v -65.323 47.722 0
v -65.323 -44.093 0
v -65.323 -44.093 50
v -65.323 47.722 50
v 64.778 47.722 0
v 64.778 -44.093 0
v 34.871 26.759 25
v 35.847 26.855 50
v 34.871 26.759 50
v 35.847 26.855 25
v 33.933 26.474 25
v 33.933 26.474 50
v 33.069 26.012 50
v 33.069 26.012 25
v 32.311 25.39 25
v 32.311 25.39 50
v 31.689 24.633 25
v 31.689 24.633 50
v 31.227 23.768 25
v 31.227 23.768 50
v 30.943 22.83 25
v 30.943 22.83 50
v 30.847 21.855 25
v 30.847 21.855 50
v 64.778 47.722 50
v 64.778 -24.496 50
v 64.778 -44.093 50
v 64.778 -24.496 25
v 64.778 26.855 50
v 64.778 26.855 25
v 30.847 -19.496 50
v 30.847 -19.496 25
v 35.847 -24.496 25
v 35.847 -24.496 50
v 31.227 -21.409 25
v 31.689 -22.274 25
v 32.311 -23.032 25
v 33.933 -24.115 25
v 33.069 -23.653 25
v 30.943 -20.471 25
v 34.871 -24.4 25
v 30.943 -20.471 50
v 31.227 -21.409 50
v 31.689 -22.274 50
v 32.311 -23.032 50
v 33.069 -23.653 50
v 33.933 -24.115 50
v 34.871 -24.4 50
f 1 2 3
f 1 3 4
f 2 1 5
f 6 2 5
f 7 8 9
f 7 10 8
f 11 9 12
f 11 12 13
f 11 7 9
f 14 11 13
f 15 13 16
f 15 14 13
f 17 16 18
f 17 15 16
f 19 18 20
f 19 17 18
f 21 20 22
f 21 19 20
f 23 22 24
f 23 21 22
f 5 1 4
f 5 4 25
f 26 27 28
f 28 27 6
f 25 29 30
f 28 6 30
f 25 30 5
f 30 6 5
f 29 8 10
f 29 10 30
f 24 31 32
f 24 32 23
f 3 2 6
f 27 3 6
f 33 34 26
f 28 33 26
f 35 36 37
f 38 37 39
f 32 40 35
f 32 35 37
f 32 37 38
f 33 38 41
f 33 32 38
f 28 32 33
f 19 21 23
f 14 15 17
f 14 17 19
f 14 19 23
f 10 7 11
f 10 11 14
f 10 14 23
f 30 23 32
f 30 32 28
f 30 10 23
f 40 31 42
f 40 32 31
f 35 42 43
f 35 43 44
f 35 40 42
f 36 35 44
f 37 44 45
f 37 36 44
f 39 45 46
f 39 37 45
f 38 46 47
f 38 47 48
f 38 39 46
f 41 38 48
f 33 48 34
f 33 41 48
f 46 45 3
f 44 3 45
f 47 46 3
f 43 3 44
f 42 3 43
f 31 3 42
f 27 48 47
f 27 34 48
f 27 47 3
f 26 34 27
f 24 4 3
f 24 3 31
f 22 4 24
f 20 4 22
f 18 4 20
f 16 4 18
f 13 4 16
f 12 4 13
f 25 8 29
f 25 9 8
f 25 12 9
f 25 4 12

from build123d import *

# Parameters (mm, degrees)
F0_W     = 130.100816
F0_H     = 91.814518
F1_DEPTH = 50
F2_W     = 33.931456
F2_H     = 51.350809
F3_DEPTH = 25
F4_R     = 5


with BuildPart() as f1:
    # F0 (on Top) → F1 (new body)
    with BuildSketch(Plane.XY):
        with Locations((-0.272177, 1.814514)):
            Rectangle(F0_W, F0_H)
    extrude(amount=F1_DEPTH)

    # F2 (on face) → F3 (cut)
    with BuildSketch(Plane.XY.offset(50)):
        with Locations((47.812503, 1.179434)):
            Rectangle(F2_W, F2_H)
    extrude(amount=-F3_DEPTH, mode=Mode.SUBTRACT)

    # F4
    f4_edges = [f1.edges().sort_by_distance(p)[0] for p in [
        (30.846775, 26.854839, 37.5),
        (30.846775, -24.49597, 37.5),
    ]]
    fillet(f4_edges, radius=F4_R)


solid = f1.part
